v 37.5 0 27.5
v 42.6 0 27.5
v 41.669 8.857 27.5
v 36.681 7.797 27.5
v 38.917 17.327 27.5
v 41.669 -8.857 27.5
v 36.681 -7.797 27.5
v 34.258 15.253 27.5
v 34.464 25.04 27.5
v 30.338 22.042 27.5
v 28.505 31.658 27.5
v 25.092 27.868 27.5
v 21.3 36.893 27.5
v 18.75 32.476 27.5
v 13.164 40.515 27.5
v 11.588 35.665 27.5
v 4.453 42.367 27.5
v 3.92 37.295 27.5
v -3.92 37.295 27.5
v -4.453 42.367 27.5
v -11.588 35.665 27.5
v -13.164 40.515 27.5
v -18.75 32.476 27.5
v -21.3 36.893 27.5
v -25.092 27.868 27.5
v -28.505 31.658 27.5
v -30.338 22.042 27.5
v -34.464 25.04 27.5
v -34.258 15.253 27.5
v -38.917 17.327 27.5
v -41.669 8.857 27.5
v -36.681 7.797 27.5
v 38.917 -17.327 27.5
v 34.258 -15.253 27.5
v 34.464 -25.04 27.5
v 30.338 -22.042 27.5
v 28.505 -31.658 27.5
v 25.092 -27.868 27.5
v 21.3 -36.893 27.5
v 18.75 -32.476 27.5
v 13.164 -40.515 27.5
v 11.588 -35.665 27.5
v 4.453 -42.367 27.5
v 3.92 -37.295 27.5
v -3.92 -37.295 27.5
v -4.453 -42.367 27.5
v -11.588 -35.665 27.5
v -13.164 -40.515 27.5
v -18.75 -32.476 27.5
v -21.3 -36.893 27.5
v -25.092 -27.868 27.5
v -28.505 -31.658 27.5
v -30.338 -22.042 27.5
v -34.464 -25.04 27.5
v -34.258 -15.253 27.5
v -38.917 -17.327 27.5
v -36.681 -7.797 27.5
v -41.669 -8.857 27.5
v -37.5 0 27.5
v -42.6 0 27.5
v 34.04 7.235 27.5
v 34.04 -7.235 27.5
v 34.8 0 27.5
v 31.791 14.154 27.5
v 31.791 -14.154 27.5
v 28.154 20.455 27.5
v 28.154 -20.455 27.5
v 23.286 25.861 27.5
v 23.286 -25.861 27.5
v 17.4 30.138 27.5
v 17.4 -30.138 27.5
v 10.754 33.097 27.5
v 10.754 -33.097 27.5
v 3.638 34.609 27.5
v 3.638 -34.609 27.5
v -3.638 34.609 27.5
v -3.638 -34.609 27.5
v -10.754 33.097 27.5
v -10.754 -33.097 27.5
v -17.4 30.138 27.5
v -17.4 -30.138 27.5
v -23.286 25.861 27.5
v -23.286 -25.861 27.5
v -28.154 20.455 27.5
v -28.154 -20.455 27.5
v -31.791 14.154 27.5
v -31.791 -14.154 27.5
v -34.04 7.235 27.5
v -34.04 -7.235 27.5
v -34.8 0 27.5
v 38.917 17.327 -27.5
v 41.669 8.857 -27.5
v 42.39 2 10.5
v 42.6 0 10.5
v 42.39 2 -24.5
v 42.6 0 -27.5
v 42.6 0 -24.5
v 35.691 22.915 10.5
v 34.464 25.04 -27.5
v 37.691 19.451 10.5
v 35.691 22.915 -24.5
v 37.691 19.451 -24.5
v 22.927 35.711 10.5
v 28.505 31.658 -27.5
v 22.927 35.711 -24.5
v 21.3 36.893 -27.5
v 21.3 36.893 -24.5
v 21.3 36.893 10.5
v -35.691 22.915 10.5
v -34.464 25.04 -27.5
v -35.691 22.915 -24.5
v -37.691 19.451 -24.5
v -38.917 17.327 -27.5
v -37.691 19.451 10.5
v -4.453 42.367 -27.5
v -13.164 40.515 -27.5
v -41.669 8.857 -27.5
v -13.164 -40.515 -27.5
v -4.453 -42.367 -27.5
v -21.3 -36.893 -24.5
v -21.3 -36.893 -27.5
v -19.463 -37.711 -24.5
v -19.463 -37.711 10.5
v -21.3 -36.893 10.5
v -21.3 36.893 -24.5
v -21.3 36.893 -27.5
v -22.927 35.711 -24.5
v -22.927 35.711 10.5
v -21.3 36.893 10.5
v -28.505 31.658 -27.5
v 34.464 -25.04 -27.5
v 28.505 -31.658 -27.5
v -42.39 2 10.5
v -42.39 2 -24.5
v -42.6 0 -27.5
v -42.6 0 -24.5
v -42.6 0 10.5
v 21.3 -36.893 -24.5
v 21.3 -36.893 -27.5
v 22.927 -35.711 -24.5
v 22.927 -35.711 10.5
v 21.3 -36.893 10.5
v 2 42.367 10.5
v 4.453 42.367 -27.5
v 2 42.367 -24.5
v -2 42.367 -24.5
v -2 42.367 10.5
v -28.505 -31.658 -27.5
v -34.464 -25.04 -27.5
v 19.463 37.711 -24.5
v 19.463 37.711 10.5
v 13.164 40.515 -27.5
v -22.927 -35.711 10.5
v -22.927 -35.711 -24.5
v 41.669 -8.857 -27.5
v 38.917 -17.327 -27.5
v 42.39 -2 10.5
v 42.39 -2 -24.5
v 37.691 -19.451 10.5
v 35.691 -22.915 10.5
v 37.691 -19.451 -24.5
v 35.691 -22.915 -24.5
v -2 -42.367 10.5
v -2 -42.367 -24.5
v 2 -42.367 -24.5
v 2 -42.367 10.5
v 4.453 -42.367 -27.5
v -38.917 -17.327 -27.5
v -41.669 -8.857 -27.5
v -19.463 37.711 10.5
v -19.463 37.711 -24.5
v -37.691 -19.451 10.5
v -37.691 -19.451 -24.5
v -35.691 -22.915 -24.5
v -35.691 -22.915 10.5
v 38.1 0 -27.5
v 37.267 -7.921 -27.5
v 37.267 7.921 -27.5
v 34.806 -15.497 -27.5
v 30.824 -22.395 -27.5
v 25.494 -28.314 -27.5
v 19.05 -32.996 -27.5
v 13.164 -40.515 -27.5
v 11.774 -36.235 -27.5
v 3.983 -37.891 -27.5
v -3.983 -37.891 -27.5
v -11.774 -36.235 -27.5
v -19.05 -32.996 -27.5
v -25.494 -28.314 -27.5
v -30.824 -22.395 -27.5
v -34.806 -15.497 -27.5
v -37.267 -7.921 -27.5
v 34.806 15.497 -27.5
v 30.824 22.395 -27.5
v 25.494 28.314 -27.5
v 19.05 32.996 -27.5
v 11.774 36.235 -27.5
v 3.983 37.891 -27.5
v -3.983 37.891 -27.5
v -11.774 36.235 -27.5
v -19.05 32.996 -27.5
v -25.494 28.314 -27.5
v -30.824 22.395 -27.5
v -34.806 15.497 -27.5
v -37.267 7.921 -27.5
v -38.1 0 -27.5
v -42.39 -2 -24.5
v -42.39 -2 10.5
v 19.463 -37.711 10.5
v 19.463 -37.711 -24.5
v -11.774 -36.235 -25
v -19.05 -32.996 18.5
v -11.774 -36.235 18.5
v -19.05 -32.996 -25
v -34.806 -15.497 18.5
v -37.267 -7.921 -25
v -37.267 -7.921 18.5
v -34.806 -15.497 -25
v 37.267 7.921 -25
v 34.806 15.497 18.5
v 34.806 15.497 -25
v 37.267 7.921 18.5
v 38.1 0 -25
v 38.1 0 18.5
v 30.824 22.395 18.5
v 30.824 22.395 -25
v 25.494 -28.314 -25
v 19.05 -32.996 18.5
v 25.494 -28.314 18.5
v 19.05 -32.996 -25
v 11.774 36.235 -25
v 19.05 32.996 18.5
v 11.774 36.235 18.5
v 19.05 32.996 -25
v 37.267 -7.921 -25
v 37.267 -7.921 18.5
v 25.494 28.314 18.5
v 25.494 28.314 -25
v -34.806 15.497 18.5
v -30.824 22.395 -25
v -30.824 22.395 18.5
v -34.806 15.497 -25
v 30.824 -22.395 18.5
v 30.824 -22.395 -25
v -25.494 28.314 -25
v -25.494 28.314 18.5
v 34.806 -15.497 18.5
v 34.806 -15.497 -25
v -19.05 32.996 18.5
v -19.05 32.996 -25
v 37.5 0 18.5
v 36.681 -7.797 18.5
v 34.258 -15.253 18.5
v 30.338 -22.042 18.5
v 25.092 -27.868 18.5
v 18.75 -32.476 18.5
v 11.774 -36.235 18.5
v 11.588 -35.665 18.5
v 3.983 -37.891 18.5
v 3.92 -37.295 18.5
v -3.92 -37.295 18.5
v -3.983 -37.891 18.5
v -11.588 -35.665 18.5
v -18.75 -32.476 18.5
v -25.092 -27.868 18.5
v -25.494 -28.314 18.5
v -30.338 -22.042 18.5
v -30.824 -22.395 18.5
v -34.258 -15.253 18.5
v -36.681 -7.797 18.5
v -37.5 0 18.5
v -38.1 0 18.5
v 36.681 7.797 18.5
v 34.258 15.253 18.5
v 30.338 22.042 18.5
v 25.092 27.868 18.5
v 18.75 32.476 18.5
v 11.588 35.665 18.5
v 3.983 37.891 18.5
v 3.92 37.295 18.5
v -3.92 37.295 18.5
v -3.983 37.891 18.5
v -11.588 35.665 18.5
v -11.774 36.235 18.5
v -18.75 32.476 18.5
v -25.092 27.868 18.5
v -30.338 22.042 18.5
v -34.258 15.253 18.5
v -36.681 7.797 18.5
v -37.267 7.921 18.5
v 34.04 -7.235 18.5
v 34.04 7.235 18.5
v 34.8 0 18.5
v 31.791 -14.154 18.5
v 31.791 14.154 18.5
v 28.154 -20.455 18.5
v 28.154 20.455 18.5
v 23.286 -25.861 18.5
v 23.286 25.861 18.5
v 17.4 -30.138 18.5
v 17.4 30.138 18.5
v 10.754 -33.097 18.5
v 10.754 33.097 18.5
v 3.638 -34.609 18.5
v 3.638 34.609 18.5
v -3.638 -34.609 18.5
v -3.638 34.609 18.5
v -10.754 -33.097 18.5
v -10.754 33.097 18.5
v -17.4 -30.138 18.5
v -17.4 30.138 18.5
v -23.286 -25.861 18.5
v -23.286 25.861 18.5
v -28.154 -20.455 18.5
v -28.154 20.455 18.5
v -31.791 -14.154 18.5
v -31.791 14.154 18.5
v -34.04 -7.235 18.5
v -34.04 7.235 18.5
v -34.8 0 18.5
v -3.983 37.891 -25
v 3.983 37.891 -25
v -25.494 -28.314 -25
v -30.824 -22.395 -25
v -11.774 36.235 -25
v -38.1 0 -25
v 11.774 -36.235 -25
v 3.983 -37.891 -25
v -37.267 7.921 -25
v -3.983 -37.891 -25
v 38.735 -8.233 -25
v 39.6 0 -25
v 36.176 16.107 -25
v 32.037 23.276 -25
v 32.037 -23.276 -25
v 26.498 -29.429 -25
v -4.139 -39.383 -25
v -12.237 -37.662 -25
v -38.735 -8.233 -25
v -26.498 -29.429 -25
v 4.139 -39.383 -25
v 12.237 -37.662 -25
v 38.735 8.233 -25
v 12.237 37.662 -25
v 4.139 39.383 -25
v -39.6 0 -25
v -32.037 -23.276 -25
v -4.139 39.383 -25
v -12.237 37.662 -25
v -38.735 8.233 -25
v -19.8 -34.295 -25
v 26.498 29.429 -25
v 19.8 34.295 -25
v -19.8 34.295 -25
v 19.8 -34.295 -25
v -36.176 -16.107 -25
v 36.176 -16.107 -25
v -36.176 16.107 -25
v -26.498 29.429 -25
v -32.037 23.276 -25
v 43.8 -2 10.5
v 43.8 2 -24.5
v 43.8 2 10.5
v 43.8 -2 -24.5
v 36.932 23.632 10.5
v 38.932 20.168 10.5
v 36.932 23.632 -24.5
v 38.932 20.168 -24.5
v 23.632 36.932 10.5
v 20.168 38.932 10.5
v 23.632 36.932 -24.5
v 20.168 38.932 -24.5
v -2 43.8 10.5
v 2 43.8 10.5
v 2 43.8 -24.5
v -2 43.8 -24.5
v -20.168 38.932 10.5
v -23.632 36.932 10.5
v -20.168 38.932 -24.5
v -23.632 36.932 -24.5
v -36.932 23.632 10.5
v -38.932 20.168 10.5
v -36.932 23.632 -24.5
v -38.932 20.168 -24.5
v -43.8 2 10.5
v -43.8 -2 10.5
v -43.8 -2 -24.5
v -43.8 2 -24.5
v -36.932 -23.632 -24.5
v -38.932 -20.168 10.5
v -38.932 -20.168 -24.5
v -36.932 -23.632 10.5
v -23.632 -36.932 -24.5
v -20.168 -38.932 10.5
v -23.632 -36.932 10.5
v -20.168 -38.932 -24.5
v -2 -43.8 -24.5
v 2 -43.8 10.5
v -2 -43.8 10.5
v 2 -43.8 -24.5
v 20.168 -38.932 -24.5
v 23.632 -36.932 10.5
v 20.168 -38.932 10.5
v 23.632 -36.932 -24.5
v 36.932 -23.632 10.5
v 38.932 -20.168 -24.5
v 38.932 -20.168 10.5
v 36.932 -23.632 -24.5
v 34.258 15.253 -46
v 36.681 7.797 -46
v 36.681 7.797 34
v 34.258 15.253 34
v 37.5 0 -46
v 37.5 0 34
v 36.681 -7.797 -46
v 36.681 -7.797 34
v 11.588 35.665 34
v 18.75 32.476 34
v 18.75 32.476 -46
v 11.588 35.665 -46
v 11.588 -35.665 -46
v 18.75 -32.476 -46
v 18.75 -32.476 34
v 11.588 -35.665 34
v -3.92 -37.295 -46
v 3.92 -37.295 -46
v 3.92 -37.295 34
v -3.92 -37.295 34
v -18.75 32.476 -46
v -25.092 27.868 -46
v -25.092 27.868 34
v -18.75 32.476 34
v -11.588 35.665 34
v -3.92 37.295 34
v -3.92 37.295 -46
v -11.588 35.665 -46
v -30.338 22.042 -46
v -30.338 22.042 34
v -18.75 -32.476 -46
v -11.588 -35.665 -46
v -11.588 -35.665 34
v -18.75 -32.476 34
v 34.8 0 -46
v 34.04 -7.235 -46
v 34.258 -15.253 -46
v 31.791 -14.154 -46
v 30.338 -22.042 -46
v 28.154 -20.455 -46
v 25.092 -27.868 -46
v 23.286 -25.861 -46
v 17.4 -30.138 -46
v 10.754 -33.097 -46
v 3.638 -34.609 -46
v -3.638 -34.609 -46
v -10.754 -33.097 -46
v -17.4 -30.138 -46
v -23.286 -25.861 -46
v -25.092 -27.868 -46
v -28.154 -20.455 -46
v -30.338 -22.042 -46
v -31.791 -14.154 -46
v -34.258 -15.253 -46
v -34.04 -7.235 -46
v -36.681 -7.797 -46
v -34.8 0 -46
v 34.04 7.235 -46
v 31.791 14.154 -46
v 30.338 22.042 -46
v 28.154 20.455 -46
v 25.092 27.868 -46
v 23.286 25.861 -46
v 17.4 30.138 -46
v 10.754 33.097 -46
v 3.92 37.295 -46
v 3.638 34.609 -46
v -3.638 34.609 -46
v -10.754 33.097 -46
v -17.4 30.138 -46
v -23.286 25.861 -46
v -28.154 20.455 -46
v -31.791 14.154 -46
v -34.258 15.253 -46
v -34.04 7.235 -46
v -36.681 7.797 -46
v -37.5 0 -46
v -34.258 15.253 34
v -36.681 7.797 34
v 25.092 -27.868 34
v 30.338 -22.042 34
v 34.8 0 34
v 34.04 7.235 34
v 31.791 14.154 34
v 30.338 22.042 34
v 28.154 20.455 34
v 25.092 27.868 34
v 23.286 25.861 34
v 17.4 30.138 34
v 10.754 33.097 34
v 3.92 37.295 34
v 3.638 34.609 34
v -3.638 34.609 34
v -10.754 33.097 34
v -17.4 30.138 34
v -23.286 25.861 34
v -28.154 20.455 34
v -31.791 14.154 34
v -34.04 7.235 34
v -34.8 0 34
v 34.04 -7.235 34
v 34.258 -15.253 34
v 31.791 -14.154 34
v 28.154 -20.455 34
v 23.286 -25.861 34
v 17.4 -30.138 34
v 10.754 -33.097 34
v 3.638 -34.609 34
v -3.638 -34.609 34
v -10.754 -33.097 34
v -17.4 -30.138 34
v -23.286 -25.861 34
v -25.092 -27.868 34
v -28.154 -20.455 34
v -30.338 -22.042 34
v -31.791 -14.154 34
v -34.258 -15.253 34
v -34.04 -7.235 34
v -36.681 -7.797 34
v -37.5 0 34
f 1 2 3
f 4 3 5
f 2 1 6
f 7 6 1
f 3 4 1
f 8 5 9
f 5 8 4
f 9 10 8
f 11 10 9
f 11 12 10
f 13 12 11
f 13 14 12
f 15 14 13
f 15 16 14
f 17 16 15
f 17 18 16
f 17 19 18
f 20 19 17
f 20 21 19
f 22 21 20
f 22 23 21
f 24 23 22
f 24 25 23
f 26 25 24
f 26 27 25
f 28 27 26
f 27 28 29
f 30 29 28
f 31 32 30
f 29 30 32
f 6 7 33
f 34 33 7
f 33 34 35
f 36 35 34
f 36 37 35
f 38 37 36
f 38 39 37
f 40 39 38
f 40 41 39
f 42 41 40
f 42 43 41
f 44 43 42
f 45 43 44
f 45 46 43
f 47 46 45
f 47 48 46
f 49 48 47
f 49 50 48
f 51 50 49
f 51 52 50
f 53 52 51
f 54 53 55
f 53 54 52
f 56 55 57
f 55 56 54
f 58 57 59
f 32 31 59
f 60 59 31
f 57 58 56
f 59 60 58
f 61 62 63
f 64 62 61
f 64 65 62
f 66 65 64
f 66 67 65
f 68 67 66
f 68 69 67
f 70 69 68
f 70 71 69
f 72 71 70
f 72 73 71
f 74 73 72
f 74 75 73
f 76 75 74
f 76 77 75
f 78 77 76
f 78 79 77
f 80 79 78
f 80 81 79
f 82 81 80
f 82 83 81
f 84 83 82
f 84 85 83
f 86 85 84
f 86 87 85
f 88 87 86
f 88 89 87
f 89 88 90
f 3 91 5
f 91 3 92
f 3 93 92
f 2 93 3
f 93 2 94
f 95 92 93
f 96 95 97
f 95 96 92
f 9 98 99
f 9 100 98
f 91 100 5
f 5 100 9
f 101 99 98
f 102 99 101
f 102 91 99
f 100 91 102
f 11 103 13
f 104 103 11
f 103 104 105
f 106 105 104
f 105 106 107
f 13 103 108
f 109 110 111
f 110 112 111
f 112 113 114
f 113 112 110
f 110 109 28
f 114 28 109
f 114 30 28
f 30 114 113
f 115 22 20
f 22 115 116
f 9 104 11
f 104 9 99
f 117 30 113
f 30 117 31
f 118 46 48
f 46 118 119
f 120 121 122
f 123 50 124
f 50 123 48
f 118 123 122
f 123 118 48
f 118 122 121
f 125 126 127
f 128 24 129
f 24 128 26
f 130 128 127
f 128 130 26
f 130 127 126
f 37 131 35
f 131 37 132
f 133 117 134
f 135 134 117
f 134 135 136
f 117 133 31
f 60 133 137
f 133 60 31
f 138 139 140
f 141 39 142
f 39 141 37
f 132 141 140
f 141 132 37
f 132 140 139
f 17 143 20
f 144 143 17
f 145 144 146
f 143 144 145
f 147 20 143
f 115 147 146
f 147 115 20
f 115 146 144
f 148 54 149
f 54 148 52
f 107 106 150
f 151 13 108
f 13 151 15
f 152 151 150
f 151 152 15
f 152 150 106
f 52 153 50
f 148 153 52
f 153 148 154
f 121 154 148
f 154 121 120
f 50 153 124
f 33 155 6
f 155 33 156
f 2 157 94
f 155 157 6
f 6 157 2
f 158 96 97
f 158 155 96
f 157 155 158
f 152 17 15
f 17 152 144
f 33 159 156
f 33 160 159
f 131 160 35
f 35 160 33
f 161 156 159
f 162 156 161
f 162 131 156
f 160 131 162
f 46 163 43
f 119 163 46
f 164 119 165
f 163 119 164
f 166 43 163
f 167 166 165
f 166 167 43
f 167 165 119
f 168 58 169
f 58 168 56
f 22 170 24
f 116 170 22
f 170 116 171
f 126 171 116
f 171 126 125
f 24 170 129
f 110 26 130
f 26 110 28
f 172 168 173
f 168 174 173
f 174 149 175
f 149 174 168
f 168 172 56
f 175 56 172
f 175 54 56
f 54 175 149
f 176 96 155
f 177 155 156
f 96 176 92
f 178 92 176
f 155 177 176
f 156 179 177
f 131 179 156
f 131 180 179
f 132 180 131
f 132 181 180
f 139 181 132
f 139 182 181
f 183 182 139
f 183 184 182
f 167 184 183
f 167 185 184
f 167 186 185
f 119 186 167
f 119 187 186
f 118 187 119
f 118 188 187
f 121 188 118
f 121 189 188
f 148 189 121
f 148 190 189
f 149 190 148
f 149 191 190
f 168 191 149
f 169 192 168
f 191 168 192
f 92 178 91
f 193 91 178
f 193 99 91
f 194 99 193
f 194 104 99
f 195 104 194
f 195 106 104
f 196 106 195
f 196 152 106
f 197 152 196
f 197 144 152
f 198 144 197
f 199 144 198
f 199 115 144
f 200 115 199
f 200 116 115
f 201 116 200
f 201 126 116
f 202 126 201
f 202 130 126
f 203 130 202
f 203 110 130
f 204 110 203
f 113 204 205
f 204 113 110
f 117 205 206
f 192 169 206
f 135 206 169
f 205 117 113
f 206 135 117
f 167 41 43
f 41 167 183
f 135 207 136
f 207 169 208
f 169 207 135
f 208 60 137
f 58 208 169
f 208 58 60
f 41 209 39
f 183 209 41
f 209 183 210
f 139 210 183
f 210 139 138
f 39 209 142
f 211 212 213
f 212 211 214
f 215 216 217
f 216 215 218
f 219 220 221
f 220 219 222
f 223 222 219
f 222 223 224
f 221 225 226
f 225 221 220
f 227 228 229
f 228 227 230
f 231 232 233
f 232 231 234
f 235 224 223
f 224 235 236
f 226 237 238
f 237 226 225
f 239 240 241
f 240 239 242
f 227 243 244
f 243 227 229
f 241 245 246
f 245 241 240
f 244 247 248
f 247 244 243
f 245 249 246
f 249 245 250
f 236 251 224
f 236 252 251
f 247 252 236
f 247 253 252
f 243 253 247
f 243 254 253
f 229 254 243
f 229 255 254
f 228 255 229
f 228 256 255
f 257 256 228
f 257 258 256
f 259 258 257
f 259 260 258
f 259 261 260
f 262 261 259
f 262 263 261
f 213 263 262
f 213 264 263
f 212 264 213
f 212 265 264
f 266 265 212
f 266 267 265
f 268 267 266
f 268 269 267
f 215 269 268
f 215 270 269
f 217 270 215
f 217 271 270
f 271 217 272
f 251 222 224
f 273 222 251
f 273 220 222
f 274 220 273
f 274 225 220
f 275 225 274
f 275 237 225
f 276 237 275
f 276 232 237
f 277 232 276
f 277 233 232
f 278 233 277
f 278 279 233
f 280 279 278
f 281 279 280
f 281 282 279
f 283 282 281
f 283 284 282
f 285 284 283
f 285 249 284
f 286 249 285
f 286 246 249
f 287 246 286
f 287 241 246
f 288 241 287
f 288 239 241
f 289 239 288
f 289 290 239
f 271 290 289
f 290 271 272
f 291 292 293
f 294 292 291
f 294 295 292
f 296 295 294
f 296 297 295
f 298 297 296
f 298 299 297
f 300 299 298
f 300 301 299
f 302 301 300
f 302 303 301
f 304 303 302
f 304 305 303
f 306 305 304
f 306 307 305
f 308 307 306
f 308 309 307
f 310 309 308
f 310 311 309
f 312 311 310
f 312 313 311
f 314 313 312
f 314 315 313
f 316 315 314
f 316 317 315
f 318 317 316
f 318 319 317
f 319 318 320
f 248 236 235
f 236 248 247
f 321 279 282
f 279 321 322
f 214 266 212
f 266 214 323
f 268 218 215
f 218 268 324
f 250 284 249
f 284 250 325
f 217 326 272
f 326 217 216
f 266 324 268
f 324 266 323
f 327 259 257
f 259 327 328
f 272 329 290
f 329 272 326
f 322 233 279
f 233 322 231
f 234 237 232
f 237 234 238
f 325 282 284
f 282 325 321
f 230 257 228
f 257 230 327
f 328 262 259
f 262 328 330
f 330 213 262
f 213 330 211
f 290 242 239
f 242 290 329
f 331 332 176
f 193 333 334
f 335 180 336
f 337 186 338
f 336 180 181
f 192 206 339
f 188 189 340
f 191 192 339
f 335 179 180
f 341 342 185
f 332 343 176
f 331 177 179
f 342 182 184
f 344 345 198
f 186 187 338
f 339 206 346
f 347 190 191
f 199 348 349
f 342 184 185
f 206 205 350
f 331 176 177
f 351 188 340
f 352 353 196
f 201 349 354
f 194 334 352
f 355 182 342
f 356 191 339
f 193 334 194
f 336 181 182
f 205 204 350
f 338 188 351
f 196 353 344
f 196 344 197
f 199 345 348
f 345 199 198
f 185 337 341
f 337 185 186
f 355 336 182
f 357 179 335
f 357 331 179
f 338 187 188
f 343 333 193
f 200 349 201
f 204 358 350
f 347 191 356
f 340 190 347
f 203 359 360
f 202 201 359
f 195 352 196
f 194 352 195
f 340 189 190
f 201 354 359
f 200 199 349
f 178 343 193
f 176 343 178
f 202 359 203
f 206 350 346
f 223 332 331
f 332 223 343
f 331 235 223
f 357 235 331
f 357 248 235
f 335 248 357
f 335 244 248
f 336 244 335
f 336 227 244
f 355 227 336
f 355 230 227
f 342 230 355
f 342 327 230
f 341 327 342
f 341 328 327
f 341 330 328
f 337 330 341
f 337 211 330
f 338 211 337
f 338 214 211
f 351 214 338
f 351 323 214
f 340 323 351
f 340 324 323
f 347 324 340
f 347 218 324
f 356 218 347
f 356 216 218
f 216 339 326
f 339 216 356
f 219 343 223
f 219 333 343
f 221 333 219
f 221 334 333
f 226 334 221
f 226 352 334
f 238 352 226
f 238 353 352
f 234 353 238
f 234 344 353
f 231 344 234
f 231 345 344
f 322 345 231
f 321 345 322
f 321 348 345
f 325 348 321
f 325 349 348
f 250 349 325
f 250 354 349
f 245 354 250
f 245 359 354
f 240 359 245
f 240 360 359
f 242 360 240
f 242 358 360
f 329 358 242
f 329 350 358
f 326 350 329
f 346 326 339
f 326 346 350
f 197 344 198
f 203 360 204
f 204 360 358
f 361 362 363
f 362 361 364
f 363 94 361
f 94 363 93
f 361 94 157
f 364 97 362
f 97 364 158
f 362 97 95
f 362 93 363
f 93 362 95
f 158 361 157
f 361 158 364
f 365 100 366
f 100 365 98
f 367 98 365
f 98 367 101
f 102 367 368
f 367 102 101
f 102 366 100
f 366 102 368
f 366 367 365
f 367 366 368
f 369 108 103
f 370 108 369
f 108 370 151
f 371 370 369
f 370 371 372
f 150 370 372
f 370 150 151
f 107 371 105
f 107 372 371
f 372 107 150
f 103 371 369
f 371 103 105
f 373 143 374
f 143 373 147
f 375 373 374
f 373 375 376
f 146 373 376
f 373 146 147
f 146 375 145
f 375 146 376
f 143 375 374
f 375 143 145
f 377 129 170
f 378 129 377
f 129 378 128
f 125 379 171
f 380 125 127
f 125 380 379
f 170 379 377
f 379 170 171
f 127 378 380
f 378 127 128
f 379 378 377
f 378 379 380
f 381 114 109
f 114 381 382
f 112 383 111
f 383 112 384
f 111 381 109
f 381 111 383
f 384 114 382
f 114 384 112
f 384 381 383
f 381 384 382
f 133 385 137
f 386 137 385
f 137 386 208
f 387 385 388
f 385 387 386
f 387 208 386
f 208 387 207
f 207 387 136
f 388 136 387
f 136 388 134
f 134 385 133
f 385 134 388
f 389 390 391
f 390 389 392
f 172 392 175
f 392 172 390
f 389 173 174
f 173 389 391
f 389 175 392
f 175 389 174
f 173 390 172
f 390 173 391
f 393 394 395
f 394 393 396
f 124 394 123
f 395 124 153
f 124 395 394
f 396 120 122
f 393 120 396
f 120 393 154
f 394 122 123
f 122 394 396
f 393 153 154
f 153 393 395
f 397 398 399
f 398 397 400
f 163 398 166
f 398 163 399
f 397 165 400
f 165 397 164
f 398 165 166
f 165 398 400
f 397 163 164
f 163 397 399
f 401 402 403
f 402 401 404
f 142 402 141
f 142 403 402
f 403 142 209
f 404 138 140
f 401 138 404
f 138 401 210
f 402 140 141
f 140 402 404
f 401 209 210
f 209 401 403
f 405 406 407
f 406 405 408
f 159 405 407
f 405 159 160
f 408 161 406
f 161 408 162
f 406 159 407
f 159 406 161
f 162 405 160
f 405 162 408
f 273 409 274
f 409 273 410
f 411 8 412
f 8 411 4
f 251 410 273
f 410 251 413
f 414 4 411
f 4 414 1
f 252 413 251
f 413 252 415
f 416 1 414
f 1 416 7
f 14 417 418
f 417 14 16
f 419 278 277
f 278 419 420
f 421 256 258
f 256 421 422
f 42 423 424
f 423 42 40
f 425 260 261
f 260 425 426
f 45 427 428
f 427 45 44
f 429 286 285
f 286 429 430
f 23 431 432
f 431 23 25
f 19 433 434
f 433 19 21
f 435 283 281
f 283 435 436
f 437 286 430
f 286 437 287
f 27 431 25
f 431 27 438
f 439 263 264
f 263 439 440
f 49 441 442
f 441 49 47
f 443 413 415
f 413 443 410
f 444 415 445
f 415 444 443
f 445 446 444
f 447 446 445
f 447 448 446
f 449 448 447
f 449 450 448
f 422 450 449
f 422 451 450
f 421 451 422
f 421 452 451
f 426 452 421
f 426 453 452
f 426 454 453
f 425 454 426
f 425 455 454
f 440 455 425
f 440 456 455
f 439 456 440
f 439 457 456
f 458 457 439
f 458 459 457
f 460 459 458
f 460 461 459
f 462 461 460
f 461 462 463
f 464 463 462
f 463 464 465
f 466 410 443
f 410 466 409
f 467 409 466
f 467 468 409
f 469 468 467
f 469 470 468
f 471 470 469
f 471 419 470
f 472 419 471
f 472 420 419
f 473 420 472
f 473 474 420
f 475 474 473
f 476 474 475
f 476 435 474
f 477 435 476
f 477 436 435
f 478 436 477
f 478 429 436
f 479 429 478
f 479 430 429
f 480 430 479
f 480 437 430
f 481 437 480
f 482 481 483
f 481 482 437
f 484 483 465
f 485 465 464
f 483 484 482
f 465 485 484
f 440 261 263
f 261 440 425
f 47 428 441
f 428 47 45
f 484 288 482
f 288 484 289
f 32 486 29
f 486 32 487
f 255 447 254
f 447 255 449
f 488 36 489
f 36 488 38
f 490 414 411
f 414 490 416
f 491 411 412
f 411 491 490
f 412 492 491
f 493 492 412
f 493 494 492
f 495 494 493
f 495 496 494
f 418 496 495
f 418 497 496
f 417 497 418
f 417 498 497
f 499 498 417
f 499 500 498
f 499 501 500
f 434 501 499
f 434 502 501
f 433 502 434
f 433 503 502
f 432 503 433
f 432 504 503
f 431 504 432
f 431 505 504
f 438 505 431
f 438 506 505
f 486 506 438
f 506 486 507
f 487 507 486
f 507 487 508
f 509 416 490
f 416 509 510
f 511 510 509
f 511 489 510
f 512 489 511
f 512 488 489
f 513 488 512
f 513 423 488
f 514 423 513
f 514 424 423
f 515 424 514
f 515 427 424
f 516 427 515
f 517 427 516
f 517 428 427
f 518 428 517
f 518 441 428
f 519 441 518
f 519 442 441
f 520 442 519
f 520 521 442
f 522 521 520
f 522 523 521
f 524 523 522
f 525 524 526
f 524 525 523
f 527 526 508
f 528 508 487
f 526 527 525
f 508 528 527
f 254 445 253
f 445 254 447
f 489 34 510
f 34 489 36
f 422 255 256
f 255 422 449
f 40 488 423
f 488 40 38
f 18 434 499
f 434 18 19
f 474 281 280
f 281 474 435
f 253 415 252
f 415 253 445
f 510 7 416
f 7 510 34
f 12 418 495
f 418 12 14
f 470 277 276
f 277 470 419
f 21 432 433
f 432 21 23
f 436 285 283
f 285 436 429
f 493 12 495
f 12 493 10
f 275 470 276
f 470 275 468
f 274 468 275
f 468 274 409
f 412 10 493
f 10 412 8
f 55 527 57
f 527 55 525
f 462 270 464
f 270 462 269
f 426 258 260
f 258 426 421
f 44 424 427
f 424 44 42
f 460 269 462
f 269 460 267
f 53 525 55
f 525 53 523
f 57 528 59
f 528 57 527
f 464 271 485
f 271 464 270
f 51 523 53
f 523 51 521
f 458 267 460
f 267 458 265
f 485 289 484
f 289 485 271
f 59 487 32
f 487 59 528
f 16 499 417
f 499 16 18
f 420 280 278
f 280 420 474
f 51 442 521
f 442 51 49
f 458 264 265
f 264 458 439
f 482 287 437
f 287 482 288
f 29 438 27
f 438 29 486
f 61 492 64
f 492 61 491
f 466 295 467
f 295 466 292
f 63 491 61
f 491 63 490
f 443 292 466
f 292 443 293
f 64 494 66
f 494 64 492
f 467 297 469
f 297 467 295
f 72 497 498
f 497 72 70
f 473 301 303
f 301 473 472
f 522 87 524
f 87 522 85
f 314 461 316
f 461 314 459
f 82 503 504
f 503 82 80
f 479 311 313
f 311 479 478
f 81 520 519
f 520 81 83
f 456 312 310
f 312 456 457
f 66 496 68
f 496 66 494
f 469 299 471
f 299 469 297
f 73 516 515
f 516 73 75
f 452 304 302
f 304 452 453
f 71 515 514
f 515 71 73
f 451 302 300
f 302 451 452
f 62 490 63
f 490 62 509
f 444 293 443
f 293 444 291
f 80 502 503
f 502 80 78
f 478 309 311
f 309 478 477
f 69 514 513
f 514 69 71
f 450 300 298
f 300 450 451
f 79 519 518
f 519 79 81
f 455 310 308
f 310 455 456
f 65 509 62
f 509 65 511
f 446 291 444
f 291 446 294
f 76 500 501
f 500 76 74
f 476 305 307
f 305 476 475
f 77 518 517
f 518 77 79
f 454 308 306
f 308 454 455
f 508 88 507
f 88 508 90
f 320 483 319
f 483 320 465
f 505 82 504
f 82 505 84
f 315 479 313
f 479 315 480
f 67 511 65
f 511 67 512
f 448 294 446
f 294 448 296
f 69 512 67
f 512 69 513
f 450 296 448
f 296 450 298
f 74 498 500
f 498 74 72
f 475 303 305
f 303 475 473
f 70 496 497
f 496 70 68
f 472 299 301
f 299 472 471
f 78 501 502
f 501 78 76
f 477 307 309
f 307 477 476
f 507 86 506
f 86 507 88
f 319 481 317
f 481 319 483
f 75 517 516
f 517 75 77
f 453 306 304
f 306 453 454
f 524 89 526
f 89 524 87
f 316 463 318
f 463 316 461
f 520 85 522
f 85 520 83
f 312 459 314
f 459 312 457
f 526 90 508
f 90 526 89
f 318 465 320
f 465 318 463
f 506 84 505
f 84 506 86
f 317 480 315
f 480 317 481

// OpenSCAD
// Parameters
nominal_size = 75; //[50:150:1]
pipe_od = 75; //[60:110:0.5]
pipe_wall = 2.7; //[1.5:5.5:0.1]
tolerance_clearance = 0.6; //[0.2:1.5:0.1]
socket_inner_diameter = 76.2; //[70:90:0.1]
socket_depth = 45; //[25:80:1]
end_wall_thickness = 6; //[3:12:0.5]
cap_wall_thickness = 4.5; //[2.5:10:0.5]
cap_outer_diameter = 85.2; //[75:120:0.1]
cap_overall_length = 55; //[35:100:1]
stop_shoulder_thickness = 2.5; //[1:6:0.5]
stop_shoulder_radial = 2.0; //[0.8:5:0.2]
chamfer_lead_in = 1; //[0:1:1]
chamfer_size = 1.5; //[0.5:4:0.1]
rib_count = 12; //[6:24:1]
rib_radial_height = 1.2; //[0.5:3:0.1]
rib_width_tangential = 4; //[2:8:0.5]
rib_length_axial = 35; //[15:70:1]
overlap = 1; //[0.5:2:0.1]
pipe_stub_length = 80; //[40:160:1]

// HT Pipe - complete geometry
module ht_pipe() {
  color([0.85, 0.85, 0.8]) {
    difference() {
      // Outer pipe
      cylinder(h=pipe_stub_length, r=pipe_od/2, center=true);
      // Inner void
      translate([0, 0, -overlap/2])
        cylinder(h=pipe_stub_length + overlap, r=(pipe_od/2) - pipe_wall, center=true);
    }
  }
}

// Cap with ribs
module cap_with_ribs() {
  color([0.2, 0.2, 0.2]) {
    difference() {
      // Cap body with end wall
      union() {
        // Outer cap body
        cylinder(h=cap_overall_length, r=cap_outer_diameter/2, center=true);
        // End wall
        translate([0, 0, cap_overall_length/2 - end_wall_thickness/2])
          cylinder(h=end_wall_thickness, r=cap_outer_diameter/2, center=true);
      }
      // Internal socket void
      translate([0, 0, -cap_overall_length/2 + (socket_depth + overlap)/2])
        cylinder(h=socket_depth + overlap, r=socket_inner_diameter/2, center=true);
      // Stop shoulder void
      translate([0, 0, -cap_overall_length/2 + socket_depth - stop_shoulder_thickness/2])
        cylinder(h=stop_shoulder_thickness + overlap, r=(socket_inner_diameter/2) - stop_shoulder_radial, center=true);
      // Chamfer relief void
      if (chamfer_lead_in == 1) {
        translate([0, 0, -cap_overall_length/2 + (chamfer_size + overlap)/2])
          rotate([180, 0, 0])
          cylinder(h=chamfer_size + overlap, r1=socket_inner_diameter/2 + chamfer_size, r2=socket_inner_diameter/2, center=true);
      }
    }
    // Outer grip ribs
    for (i = [0:rib_count-1]) {
      rotate([0, 0, i*360/rib_count])
        translate([cap_outer_diameter/2 + (rib_radial_height + overlap)/2 - overlap, 0, -cap_overall_length/2 + rib_length_axial/2 + end_wall_thickness/2])
        cube([rib_radial_height + overlap, rib_width_tangential, rib_length_axial], center=true);
    }
  }
}

// Assembly
module assembly() {
  cap_with_ribs();
  translate([0, 0, -cap_overall_length/2 + socket_depth/2 - overlap])
    ht_pipe();
}

assembly();
